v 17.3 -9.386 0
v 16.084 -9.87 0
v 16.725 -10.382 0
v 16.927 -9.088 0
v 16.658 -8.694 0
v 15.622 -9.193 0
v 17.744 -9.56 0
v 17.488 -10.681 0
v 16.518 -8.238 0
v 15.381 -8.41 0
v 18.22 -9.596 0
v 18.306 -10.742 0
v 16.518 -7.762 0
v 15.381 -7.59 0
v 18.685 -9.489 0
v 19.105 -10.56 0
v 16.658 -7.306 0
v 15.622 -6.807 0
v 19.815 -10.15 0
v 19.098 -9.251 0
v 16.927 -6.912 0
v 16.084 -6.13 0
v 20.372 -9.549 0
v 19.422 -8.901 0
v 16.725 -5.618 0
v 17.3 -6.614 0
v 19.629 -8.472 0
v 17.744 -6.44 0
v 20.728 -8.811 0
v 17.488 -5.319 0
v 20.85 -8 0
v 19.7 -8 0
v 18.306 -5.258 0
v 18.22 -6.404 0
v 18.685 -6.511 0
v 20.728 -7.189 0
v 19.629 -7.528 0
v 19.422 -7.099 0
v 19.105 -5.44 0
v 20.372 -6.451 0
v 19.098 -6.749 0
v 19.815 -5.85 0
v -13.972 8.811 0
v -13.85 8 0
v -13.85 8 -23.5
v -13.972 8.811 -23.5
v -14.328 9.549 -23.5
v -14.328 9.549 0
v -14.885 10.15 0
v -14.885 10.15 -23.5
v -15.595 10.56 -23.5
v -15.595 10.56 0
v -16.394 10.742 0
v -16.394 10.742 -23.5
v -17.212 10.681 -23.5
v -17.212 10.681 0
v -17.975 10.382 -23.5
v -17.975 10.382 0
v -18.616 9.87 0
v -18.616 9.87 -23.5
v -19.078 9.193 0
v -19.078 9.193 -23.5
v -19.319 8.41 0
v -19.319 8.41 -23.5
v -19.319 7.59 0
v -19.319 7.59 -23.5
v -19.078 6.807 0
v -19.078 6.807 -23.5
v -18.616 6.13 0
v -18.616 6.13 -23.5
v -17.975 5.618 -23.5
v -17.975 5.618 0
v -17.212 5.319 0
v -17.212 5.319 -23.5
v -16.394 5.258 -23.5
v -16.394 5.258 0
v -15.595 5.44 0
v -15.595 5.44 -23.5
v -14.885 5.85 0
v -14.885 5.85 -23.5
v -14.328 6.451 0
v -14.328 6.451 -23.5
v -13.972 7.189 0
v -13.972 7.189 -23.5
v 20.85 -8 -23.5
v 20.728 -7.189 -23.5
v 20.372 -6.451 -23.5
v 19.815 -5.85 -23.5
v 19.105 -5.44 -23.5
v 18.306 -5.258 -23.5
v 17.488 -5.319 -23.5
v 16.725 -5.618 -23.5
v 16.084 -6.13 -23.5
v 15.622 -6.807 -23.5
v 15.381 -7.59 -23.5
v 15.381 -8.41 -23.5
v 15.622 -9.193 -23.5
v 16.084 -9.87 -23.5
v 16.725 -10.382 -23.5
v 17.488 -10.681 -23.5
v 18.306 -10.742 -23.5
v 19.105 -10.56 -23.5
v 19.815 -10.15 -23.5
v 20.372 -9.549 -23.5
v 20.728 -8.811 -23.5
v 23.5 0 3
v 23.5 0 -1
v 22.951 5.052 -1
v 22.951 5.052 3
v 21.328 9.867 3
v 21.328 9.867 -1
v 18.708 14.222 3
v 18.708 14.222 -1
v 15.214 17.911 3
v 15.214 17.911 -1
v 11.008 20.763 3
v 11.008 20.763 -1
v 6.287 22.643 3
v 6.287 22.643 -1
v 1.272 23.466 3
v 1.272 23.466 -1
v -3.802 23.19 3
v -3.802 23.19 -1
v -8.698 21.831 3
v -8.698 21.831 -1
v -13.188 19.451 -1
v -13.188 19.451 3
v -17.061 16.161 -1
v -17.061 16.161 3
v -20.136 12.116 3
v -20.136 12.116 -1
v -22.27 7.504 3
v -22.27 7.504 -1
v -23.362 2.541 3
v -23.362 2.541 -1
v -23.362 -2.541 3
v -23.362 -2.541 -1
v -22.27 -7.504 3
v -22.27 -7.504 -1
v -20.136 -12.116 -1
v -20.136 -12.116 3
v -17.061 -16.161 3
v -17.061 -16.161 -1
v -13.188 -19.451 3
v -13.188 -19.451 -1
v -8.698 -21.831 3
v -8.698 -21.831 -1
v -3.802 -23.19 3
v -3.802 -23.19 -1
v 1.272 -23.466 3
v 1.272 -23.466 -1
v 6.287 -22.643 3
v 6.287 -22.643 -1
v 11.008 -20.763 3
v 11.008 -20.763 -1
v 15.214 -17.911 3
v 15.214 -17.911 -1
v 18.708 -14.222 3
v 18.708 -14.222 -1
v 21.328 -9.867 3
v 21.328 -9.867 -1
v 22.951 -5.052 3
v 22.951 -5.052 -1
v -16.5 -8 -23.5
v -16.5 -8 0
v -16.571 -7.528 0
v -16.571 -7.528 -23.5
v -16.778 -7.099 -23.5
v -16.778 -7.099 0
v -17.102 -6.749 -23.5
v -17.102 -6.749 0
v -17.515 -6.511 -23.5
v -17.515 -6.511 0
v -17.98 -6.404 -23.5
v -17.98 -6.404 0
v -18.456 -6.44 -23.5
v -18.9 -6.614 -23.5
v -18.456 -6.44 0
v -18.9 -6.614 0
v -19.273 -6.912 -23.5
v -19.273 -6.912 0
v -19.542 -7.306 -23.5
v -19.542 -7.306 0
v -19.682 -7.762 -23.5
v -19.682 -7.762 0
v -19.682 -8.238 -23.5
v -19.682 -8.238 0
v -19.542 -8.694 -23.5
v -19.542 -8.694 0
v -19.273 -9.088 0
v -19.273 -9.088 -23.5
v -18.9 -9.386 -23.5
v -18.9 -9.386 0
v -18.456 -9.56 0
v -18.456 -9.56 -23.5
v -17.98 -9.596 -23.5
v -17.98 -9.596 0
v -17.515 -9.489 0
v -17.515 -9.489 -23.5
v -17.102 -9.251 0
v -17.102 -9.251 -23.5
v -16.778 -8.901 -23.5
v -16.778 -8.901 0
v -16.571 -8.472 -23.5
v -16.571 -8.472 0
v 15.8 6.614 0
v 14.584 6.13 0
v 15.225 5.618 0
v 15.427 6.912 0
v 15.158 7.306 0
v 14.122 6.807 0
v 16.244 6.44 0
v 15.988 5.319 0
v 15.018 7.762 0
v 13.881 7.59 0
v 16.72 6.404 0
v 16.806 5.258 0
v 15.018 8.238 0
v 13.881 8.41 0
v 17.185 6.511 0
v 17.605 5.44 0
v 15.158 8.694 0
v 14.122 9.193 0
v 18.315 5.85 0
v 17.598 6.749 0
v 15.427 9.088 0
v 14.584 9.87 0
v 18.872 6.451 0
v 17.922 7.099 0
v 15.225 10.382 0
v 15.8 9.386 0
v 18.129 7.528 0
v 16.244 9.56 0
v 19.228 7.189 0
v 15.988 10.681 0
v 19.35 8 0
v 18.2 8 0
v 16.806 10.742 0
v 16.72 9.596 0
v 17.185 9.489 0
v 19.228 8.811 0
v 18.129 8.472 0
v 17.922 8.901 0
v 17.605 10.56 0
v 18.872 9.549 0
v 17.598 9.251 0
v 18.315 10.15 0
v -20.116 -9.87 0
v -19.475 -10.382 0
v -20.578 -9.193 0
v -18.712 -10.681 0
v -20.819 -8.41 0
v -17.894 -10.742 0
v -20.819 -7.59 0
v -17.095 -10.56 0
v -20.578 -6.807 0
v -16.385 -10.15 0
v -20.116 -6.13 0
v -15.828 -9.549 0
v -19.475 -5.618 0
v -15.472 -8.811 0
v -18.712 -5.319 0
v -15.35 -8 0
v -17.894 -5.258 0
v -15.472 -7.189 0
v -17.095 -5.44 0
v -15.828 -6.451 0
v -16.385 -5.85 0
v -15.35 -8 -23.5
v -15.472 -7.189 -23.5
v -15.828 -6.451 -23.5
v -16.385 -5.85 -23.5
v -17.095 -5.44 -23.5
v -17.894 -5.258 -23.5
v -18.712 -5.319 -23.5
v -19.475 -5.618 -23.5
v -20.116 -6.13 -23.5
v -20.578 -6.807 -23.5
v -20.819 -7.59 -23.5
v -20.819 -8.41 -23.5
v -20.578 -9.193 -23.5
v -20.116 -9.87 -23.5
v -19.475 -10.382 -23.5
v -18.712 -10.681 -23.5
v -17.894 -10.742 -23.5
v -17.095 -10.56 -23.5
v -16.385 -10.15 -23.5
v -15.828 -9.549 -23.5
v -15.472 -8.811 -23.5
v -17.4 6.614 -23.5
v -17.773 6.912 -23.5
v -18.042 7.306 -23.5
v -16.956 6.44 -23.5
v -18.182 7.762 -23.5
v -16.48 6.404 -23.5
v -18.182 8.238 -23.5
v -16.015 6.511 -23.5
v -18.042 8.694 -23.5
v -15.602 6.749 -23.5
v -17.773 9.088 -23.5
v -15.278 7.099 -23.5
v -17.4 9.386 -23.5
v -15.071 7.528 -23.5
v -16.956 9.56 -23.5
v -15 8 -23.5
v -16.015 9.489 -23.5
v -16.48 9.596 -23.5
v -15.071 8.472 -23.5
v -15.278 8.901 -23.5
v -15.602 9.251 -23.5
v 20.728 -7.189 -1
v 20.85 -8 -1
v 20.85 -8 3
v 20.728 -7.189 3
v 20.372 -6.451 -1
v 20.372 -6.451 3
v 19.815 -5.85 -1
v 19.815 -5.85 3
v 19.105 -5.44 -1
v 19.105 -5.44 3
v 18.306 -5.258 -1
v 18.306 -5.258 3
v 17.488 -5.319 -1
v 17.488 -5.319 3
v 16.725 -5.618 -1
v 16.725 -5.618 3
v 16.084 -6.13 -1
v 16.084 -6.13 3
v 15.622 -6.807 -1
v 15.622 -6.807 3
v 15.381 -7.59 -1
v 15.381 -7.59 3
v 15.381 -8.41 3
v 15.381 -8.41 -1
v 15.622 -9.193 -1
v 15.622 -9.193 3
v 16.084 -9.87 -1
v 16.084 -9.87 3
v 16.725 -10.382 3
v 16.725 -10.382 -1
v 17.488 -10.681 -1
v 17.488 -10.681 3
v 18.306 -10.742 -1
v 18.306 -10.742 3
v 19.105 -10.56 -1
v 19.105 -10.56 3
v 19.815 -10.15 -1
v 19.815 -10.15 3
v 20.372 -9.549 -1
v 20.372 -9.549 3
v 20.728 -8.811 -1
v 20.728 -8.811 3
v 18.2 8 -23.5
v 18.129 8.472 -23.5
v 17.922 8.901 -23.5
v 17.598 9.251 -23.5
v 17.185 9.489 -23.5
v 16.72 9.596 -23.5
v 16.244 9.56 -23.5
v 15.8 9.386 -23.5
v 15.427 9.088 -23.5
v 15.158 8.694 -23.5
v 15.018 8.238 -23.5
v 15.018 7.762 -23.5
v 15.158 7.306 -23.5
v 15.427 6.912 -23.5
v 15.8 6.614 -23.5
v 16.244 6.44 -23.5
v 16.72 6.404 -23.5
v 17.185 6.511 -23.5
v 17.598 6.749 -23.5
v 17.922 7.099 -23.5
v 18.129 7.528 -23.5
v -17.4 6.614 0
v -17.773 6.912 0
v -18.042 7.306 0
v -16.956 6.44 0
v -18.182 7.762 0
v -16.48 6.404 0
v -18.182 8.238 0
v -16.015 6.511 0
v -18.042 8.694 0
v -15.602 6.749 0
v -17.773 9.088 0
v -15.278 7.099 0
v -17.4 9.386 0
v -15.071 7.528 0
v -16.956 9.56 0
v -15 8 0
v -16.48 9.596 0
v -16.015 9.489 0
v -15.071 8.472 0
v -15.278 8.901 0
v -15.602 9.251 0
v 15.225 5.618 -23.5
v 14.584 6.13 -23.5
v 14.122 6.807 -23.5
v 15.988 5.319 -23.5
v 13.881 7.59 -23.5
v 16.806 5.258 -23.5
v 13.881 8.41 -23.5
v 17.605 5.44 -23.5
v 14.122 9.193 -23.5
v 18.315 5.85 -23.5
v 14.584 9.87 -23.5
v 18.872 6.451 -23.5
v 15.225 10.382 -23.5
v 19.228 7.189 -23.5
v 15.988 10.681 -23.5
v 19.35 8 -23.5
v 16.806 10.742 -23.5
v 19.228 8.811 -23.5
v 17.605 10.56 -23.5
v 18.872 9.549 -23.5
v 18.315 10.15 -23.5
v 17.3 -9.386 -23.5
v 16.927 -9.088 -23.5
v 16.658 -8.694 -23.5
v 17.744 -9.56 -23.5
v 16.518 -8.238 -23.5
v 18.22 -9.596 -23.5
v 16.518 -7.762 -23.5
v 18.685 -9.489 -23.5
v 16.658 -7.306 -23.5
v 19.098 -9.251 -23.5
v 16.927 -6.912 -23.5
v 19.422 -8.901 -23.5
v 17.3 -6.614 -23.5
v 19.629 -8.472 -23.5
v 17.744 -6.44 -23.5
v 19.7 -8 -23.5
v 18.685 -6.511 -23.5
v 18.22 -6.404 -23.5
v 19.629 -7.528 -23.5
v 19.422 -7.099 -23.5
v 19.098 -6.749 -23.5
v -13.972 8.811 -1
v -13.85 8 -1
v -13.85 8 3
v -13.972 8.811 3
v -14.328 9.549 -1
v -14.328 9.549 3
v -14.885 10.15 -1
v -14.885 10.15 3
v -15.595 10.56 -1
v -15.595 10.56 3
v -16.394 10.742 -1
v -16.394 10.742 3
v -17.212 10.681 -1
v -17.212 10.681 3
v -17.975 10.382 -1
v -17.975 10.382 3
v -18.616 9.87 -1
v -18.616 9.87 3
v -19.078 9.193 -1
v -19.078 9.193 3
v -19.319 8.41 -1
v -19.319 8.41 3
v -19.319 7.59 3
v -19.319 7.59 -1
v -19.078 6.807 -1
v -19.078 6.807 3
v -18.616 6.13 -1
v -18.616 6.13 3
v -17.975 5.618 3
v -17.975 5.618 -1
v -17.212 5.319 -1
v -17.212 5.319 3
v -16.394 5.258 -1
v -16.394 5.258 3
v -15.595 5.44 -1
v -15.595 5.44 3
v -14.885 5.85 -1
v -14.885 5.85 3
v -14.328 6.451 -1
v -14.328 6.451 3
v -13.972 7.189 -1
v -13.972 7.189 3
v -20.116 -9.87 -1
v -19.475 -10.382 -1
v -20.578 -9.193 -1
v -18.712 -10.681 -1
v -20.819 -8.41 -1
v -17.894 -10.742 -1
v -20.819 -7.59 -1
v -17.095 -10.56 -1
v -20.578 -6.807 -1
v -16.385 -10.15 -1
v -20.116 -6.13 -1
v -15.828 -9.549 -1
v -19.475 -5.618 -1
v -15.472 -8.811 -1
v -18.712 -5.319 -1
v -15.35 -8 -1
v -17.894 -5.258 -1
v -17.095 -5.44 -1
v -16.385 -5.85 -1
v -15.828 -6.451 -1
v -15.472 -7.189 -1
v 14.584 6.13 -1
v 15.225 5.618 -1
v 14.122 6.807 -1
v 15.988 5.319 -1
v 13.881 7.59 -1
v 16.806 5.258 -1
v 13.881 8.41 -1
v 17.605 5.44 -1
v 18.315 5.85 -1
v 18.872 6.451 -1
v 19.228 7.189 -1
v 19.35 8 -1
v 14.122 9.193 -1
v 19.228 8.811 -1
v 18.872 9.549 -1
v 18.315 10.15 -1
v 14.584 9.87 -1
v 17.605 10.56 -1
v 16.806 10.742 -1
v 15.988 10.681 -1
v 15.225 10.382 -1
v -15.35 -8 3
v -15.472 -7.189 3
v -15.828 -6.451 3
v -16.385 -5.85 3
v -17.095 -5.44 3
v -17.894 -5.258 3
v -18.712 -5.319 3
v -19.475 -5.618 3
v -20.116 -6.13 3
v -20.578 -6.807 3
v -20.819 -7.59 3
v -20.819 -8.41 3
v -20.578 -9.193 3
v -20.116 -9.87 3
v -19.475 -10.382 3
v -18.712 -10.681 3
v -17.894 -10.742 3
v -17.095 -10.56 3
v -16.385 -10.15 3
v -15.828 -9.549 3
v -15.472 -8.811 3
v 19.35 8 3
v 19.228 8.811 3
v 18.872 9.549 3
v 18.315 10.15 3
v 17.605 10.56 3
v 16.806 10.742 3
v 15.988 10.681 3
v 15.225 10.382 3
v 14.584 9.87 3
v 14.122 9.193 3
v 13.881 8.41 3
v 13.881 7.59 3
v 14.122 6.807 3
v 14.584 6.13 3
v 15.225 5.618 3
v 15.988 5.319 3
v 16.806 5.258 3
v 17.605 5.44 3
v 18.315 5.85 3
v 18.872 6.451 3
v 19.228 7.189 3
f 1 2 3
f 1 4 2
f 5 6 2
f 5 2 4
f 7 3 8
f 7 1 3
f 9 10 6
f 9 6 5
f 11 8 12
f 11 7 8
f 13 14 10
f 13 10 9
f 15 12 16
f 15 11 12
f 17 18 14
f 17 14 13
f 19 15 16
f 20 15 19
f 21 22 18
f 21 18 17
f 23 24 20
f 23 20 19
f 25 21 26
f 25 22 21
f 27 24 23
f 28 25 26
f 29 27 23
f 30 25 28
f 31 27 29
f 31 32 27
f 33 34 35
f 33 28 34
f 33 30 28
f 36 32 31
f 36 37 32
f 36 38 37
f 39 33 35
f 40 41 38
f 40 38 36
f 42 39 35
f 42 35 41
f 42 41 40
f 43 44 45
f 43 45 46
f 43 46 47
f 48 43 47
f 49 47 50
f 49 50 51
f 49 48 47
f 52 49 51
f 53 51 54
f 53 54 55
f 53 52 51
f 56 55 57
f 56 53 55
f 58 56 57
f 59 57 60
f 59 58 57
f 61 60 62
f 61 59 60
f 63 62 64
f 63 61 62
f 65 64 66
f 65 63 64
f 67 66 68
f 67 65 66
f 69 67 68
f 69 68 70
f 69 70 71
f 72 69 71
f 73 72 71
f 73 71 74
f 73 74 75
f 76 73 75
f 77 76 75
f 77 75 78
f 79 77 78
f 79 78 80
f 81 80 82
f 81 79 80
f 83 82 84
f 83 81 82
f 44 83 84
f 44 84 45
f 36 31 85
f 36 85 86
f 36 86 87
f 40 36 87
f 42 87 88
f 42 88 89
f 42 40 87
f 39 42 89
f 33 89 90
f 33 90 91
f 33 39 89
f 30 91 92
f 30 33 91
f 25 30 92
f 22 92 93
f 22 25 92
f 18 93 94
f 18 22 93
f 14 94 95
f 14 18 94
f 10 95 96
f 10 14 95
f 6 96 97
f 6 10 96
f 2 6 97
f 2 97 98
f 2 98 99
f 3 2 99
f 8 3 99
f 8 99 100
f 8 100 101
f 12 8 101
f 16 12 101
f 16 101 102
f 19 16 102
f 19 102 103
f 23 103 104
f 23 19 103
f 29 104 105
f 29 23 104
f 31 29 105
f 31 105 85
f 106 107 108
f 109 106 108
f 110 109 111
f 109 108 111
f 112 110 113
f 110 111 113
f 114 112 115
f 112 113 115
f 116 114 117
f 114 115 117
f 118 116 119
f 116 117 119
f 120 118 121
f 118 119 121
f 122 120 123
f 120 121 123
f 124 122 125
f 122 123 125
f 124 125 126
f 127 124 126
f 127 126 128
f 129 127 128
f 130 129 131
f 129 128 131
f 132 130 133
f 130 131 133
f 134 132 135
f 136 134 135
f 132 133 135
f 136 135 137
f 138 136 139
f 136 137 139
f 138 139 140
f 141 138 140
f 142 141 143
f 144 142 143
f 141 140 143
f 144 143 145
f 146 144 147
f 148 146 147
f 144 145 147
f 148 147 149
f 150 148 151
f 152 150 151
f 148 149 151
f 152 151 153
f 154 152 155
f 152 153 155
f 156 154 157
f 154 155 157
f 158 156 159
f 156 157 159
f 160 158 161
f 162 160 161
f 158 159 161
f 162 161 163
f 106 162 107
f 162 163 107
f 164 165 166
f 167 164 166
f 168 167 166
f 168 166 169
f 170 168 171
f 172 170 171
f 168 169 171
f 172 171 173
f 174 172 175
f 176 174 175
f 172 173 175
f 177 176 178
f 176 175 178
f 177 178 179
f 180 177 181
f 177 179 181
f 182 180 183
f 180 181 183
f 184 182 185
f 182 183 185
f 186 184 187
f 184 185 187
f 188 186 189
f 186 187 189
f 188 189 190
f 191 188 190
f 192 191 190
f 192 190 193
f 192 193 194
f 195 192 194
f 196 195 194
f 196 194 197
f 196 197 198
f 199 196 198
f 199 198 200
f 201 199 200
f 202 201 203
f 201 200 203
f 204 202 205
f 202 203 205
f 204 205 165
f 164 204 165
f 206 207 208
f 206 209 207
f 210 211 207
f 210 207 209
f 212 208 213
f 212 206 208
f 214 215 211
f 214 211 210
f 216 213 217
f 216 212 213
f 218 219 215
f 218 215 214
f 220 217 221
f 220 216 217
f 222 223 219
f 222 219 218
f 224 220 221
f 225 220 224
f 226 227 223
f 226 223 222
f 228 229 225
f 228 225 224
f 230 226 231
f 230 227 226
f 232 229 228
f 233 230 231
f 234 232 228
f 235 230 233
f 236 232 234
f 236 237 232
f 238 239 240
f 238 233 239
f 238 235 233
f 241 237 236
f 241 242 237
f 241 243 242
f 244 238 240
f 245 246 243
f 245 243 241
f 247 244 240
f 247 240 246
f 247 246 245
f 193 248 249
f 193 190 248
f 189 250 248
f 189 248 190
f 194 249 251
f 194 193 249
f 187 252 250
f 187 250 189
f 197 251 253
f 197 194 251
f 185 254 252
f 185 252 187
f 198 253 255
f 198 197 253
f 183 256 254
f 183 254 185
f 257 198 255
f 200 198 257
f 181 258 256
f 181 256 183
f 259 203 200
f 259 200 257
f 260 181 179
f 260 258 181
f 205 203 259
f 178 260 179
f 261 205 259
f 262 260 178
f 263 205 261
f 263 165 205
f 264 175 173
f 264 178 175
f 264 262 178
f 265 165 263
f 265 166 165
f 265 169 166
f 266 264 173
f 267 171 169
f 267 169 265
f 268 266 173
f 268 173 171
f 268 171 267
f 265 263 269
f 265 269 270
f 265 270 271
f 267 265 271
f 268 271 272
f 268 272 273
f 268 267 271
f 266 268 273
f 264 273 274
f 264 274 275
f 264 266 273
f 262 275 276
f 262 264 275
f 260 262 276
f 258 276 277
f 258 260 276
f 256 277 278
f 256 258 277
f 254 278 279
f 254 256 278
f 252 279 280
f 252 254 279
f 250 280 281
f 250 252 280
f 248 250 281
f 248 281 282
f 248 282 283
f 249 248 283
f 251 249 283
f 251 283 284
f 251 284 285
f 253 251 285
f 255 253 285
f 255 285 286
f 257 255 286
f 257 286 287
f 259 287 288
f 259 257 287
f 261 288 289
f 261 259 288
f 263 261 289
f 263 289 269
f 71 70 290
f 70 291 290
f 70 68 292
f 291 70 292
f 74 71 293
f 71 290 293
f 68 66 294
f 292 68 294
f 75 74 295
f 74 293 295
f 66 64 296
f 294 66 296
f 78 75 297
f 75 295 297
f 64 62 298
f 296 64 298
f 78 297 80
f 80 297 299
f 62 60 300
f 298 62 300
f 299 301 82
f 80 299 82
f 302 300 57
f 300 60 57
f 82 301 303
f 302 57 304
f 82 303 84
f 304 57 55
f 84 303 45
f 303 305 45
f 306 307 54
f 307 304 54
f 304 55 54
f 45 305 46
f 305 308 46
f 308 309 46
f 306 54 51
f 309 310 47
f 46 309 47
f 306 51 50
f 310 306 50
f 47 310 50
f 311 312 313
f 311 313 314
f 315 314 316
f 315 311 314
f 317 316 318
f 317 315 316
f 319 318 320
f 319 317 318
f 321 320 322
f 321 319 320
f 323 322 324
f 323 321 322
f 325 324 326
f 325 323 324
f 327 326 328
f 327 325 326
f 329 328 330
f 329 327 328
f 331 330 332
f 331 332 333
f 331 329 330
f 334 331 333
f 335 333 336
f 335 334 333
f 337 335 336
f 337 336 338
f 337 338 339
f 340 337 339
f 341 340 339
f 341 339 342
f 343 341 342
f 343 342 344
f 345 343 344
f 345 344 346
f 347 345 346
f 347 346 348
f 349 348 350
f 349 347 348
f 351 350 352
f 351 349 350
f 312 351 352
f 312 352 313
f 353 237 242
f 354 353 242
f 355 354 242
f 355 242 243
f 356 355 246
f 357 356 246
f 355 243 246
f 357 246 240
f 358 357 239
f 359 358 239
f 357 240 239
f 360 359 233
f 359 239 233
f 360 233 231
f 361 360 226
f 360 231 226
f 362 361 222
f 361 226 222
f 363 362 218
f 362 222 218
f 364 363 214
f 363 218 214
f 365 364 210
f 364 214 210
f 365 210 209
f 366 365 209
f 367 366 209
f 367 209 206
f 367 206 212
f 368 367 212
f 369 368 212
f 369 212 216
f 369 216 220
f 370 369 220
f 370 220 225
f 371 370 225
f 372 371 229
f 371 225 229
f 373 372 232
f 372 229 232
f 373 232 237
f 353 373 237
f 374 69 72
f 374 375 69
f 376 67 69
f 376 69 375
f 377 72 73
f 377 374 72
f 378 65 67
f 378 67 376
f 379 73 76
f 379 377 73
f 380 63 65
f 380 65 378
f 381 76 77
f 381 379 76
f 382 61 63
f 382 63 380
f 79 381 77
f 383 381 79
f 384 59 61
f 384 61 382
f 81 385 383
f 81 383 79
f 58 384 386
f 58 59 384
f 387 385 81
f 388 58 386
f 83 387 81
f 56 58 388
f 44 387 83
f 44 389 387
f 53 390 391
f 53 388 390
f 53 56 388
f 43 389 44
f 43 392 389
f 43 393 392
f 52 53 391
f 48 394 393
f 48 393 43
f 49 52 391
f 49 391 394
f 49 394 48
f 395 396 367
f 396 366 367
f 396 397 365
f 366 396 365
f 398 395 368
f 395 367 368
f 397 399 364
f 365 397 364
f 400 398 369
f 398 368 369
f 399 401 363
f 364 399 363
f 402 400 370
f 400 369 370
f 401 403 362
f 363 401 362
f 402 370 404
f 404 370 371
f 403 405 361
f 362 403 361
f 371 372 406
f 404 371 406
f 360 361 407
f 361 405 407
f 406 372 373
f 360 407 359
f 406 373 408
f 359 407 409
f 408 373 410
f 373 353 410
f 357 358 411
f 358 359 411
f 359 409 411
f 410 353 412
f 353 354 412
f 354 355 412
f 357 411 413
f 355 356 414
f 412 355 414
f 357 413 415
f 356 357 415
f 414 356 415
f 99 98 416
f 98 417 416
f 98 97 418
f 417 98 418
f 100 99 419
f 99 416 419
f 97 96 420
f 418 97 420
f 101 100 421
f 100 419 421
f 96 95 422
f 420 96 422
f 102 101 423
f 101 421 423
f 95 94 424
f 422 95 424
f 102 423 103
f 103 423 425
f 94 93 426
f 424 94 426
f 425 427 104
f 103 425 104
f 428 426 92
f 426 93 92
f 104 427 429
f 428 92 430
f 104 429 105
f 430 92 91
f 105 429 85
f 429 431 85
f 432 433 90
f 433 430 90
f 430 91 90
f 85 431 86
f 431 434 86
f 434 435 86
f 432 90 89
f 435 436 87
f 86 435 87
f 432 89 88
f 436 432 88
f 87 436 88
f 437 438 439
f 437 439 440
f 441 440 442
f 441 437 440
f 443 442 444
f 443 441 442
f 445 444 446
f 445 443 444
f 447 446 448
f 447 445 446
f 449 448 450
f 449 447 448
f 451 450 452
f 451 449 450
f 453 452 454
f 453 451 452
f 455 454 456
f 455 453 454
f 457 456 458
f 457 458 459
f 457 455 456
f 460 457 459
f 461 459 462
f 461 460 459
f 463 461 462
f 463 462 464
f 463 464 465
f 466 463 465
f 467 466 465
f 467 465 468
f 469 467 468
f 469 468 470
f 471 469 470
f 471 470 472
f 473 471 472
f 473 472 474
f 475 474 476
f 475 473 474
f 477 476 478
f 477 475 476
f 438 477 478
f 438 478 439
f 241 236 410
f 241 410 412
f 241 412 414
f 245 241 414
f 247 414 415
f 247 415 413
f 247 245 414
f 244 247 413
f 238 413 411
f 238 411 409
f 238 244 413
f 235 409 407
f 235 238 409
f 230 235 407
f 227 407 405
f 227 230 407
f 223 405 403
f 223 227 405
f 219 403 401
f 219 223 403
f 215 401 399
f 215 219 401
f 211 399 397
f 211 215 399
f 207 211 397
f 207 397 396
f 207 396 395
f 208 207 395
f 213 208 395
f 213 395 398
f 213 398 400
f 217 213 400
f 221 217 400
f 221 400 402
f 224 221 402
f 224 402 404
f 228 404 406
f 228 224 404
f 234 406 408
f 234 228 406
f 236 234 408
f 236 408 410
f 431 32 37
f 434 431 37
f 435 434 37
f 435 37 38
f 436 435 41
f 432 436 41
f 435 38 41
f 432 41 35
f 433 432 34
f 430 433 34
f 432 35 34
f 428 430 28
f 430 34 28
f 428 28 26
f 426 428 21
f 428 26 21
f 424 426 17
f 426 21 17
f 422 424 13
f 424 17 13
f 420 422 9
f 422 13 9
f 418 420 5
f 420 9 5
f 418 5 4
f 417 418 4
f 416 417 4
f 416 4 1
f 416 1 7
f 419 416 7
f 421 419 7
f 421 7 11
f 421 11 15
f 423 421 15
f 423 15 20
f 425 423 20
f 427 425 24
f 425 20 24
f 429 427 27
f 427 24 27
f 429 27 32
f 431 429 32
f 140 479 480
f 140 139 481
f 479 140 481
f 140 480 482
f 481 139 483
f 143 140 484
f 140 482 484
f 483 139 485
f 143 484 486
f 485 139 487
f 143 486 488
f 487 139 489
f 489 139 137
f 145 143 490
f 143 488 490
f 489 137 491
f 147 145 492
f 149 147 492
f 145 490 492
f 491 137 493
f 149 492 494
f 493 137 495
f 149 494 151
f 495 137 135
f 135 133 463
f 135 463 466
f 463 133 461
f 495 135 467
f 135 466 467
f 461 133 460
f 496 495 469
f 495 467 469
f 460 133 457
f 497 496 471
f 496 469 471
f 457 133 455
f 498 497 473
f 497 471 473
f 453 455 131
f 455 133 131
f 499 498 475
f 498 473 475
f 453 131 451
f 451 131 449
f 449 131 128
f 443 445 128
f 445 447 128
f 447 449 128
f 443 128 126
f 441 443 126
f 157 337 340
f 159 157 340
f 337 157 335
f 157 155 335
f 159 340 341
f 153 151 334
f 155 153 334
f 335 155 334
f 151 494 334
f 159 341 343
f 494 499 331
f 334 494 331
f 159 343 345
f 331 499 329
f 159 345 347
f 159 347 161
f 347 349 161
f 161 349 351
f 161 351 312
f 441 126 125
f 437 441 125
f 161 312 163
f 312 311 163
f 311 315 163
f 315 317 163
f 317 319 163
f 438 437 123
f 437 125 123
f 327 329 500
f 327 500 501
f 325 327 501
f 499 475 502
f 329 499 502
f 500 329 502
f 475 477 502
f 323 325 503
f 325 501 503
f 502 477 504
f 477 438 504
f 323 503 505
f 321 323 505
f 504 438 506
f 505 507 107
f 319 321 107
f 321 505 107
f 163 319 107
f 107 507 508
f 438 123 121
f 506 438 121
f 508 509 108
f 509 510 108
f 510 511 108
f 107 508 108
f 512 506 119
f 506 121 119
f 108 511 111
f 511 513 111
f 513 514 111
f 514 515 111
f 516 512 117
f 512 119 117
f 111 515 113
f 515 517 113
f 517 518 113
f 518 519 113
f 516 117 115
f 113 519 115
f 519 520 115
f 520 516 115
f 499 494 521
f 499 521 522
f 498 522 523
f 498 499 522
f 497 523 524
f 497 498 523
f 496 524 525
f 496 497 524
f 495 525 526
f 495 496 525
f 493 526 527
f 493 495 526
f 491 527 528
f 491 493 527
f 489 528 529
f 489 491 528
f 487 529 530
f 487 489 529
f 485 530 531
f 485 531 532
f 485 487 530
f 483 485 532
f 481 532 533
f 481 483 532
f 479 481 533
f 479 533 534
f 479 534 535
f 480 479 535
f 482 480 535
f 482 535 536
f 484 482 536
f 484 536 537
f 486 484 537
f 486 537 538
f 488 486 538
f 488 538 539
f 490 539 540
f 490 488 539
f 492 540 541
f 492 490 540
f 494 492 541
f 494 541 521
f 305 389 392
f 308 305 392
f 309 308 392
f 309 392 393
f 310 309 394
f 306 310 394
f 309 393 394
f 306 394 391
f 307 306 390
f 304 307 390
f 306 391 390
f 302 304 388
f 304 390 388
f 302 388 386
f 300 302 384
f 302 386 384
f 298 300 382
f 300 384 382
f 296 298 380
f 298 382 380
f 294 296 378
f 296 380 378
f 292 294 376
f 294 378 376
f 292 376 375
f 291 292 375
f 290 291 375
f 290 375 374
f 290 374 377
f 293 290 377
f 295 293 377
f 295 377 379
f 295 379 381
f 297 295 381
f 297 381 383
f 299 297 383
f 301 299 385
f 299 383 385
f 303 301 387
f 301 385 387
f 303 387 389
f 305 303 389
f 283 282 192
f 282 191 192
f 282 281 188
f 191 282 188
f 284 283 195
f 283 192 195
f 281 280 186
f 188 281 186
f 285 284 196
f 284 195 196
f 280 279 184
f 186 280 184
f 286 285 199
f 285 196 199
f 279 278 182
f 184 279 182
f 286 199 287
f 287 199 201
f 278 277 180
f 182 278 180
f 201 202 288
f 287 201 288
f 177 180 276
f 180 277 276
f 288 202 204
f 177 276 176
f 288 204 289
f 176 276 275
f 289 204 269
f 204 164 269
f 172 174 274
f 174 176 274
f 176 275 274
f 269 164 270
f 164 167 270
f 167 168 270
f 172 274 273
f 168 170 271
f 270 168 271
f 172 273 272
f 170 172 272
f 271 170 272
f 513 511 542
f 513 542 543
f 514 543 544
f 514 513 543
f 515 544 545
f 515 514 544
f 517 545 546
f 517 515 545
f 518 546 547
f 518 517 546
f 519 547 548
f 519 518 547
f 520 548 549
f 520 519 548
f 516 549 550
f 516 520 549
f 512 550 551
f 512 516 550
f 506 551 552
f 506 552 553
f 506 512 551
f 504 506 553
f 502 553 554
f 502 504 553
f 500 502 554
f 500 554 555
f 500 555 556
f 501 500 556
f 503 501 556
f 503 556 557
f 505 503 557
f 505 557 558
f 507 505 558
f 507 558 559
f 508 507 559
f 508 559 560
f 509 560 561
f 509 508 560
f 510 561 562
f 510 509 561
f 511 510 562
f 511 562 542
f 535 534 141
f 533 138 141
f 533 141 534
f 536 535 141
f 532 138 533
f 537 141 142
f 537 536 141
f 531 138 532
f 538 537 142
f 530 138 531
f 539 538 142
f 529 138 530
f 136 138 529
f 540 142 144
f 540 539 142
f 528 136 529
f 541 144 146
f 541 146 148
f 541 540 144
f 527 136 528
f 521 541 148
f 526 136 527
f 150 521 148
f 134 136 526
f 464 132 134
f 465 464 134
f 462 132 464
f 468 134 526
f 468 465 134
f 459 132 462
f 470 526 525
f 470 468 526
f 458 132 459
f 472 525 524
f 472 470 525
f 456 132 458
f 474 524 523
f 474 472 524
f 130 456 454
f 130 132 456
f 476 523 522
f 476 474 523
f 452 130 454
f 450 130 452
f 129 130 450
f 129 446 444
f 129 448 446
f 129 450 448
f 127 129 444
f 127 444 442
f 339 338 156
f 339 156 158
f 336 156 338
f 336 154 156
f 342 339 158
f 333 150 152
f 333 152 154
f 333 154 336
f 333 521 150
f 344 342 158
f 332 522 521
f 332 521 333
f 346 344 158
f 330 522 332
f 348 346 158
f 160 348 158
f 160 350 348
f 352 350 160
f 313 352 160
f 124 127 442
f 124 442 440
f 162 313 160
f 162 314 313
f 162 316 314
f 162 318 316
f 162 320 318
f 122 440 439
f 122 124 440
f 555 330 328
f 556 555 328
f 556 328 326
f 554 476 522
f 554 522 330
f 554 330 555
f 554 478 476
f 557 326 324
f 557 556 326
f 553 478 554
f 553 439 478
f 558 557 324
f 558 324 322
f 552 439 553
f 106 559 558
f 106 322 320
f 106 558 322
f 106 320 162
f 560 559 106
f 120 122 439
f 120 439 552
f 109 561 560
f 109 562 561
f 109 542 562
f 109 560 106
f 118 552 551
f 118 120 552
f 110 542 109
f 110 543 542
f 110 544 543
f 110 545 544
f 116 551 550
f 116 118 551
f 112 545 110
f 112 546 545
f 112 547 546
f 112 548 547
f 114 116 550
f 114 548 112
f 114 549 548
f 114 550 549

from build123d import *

# Parameters (mm, degrees)
EXTRUDE_1_DEPTH      = 3
EXTRUDE_1_DEPTH_BACK = 1
SKETCH_1_R           = 23.5
SKETCH_1_4_R         = 2.75
SKETCH_1_4_R_2       = 1.6
EXTRUDE_2_DEPTH      = 23.5
EXTRUDE_2_2_DEPTH    = 23.5
EXTRUDE_2_3_DEPTH    = 23.5
EXTRUDE_2_4_DEPTH    = 23.5


with BuildPart() as part:
    # ｽｹｯﾁ1 → ﾎﾞｽ - 押し出し1 (new, two sides: drawn at the far end of the back side and taken through both)
    with BuildSketch(Plane.XY.offset(-EXTRUDE_1_DEPTH_BACK)):
        Circle(SKETCH_1_R)
        with BuildLine():
            ThreePointArc((-15.35, -8), (-20.044543648, -9.944543648), (-18.1, -5.25))
            ThreePointArc((-18.1, -5.25), (-16.155456352, -6.055456352), (-15.35, -8))
        make_face(mode=Mode.SUBTRACT)
        with BuildLine():
            ThreePointArc((20.85, -8), (16.155456352, -9.944543648), (18.1, -5.25))
            ThreePointArc((18.1, -5.25), (20.044543648, -6.055456352), (20.85, -8))
        make_face(mode=Mode.SUBTRACT)
        with BuildLine():
            ThreePointArc((-13.85, 8), (-14.655456352, 6.055456352), (-16.6, 5.25))
            ThreePointArc((-16.6, 5.25), (-18.544543648, 9.944543648), (-13.85, 8))
        make_face(mode=Mode.SUBTRACT)
        with BuildLine():
            ThreePointArc((19.35, 8), (18.544543648, 6.055456352), (16.6, 5.25))
            ThreePointArc((16.6, 5.25), (14.655456352, 9.944543648), (19.35, 8))
        make_face(mode=Mode.SUBTRACT)
    extrude(amount=EXTRUDE_1_DEPTH + EXTRUDE_1_DEPTH_BACK)


with BuildPart() as body_2:
    # ｽｹｯﾁ1<4> → ﾎﾞｽ - 押し出し2 (new body)
    with BuildSketch(Plane.XY):
        with Locations((16.6, 8)):
            Circle(SKETCH_1_4_R)
        with Locations((16.6, 8)):
            Circle(SKETCH_1_4_R_2, mode=Mode.SUBTRACT)
    extrude(amount=-EXTRUDE_2_DEPTH)


with BuildPart() as body_3:
    # ｽｹｯﾁ1<4> → Extrude 2 2 (new body)
    with BuildSketch(Plane.XY):
        with Locations((18.1, -8)):
            Circle(SKETCH_1_4_R)
        with Locations((18.1, -8)):
            Circle(SKETCH_1_4_R_2, mode=Mode.SUBTRACT)
    extrude(amount=-EXTRUDE_2_2_DEPTH)


with BuildPart() as body_4:
    # ｽｹｯﾁ1<4> → Extrude 2 3 (new body)
    with BuildSketch(Plane.XY):
        with Locations((-16.6, 8)):
            Circle(SKETCH_1_4_R)
        with Locations((-16.6, 8)):
            Circle(SKETCH_1_4_R_2, mode=Mode.SUBTRACT)
    extrude(amount=-EXTRUDE_2_3_DEPTH)


with BuildPart() as body_5:
    # ｽｹｯﾁ1<4> → Extrude 2 4 (new body)
    with BuildSketch(Plane.XY):
        with Locations((-18.1, -8)):
            Circle(SKETCH_1_4_R)
        with Locations((-18.1, -8)):
            Circle(SKETCH_1_4_R_2, mode=Mode.SUBTRACT)
    extrude(amount=-EXTRUDE_2_4_DEPTH)


solid = Compound([part.part, body_2.part, body_3.part, body_4.part, body_5.part])
